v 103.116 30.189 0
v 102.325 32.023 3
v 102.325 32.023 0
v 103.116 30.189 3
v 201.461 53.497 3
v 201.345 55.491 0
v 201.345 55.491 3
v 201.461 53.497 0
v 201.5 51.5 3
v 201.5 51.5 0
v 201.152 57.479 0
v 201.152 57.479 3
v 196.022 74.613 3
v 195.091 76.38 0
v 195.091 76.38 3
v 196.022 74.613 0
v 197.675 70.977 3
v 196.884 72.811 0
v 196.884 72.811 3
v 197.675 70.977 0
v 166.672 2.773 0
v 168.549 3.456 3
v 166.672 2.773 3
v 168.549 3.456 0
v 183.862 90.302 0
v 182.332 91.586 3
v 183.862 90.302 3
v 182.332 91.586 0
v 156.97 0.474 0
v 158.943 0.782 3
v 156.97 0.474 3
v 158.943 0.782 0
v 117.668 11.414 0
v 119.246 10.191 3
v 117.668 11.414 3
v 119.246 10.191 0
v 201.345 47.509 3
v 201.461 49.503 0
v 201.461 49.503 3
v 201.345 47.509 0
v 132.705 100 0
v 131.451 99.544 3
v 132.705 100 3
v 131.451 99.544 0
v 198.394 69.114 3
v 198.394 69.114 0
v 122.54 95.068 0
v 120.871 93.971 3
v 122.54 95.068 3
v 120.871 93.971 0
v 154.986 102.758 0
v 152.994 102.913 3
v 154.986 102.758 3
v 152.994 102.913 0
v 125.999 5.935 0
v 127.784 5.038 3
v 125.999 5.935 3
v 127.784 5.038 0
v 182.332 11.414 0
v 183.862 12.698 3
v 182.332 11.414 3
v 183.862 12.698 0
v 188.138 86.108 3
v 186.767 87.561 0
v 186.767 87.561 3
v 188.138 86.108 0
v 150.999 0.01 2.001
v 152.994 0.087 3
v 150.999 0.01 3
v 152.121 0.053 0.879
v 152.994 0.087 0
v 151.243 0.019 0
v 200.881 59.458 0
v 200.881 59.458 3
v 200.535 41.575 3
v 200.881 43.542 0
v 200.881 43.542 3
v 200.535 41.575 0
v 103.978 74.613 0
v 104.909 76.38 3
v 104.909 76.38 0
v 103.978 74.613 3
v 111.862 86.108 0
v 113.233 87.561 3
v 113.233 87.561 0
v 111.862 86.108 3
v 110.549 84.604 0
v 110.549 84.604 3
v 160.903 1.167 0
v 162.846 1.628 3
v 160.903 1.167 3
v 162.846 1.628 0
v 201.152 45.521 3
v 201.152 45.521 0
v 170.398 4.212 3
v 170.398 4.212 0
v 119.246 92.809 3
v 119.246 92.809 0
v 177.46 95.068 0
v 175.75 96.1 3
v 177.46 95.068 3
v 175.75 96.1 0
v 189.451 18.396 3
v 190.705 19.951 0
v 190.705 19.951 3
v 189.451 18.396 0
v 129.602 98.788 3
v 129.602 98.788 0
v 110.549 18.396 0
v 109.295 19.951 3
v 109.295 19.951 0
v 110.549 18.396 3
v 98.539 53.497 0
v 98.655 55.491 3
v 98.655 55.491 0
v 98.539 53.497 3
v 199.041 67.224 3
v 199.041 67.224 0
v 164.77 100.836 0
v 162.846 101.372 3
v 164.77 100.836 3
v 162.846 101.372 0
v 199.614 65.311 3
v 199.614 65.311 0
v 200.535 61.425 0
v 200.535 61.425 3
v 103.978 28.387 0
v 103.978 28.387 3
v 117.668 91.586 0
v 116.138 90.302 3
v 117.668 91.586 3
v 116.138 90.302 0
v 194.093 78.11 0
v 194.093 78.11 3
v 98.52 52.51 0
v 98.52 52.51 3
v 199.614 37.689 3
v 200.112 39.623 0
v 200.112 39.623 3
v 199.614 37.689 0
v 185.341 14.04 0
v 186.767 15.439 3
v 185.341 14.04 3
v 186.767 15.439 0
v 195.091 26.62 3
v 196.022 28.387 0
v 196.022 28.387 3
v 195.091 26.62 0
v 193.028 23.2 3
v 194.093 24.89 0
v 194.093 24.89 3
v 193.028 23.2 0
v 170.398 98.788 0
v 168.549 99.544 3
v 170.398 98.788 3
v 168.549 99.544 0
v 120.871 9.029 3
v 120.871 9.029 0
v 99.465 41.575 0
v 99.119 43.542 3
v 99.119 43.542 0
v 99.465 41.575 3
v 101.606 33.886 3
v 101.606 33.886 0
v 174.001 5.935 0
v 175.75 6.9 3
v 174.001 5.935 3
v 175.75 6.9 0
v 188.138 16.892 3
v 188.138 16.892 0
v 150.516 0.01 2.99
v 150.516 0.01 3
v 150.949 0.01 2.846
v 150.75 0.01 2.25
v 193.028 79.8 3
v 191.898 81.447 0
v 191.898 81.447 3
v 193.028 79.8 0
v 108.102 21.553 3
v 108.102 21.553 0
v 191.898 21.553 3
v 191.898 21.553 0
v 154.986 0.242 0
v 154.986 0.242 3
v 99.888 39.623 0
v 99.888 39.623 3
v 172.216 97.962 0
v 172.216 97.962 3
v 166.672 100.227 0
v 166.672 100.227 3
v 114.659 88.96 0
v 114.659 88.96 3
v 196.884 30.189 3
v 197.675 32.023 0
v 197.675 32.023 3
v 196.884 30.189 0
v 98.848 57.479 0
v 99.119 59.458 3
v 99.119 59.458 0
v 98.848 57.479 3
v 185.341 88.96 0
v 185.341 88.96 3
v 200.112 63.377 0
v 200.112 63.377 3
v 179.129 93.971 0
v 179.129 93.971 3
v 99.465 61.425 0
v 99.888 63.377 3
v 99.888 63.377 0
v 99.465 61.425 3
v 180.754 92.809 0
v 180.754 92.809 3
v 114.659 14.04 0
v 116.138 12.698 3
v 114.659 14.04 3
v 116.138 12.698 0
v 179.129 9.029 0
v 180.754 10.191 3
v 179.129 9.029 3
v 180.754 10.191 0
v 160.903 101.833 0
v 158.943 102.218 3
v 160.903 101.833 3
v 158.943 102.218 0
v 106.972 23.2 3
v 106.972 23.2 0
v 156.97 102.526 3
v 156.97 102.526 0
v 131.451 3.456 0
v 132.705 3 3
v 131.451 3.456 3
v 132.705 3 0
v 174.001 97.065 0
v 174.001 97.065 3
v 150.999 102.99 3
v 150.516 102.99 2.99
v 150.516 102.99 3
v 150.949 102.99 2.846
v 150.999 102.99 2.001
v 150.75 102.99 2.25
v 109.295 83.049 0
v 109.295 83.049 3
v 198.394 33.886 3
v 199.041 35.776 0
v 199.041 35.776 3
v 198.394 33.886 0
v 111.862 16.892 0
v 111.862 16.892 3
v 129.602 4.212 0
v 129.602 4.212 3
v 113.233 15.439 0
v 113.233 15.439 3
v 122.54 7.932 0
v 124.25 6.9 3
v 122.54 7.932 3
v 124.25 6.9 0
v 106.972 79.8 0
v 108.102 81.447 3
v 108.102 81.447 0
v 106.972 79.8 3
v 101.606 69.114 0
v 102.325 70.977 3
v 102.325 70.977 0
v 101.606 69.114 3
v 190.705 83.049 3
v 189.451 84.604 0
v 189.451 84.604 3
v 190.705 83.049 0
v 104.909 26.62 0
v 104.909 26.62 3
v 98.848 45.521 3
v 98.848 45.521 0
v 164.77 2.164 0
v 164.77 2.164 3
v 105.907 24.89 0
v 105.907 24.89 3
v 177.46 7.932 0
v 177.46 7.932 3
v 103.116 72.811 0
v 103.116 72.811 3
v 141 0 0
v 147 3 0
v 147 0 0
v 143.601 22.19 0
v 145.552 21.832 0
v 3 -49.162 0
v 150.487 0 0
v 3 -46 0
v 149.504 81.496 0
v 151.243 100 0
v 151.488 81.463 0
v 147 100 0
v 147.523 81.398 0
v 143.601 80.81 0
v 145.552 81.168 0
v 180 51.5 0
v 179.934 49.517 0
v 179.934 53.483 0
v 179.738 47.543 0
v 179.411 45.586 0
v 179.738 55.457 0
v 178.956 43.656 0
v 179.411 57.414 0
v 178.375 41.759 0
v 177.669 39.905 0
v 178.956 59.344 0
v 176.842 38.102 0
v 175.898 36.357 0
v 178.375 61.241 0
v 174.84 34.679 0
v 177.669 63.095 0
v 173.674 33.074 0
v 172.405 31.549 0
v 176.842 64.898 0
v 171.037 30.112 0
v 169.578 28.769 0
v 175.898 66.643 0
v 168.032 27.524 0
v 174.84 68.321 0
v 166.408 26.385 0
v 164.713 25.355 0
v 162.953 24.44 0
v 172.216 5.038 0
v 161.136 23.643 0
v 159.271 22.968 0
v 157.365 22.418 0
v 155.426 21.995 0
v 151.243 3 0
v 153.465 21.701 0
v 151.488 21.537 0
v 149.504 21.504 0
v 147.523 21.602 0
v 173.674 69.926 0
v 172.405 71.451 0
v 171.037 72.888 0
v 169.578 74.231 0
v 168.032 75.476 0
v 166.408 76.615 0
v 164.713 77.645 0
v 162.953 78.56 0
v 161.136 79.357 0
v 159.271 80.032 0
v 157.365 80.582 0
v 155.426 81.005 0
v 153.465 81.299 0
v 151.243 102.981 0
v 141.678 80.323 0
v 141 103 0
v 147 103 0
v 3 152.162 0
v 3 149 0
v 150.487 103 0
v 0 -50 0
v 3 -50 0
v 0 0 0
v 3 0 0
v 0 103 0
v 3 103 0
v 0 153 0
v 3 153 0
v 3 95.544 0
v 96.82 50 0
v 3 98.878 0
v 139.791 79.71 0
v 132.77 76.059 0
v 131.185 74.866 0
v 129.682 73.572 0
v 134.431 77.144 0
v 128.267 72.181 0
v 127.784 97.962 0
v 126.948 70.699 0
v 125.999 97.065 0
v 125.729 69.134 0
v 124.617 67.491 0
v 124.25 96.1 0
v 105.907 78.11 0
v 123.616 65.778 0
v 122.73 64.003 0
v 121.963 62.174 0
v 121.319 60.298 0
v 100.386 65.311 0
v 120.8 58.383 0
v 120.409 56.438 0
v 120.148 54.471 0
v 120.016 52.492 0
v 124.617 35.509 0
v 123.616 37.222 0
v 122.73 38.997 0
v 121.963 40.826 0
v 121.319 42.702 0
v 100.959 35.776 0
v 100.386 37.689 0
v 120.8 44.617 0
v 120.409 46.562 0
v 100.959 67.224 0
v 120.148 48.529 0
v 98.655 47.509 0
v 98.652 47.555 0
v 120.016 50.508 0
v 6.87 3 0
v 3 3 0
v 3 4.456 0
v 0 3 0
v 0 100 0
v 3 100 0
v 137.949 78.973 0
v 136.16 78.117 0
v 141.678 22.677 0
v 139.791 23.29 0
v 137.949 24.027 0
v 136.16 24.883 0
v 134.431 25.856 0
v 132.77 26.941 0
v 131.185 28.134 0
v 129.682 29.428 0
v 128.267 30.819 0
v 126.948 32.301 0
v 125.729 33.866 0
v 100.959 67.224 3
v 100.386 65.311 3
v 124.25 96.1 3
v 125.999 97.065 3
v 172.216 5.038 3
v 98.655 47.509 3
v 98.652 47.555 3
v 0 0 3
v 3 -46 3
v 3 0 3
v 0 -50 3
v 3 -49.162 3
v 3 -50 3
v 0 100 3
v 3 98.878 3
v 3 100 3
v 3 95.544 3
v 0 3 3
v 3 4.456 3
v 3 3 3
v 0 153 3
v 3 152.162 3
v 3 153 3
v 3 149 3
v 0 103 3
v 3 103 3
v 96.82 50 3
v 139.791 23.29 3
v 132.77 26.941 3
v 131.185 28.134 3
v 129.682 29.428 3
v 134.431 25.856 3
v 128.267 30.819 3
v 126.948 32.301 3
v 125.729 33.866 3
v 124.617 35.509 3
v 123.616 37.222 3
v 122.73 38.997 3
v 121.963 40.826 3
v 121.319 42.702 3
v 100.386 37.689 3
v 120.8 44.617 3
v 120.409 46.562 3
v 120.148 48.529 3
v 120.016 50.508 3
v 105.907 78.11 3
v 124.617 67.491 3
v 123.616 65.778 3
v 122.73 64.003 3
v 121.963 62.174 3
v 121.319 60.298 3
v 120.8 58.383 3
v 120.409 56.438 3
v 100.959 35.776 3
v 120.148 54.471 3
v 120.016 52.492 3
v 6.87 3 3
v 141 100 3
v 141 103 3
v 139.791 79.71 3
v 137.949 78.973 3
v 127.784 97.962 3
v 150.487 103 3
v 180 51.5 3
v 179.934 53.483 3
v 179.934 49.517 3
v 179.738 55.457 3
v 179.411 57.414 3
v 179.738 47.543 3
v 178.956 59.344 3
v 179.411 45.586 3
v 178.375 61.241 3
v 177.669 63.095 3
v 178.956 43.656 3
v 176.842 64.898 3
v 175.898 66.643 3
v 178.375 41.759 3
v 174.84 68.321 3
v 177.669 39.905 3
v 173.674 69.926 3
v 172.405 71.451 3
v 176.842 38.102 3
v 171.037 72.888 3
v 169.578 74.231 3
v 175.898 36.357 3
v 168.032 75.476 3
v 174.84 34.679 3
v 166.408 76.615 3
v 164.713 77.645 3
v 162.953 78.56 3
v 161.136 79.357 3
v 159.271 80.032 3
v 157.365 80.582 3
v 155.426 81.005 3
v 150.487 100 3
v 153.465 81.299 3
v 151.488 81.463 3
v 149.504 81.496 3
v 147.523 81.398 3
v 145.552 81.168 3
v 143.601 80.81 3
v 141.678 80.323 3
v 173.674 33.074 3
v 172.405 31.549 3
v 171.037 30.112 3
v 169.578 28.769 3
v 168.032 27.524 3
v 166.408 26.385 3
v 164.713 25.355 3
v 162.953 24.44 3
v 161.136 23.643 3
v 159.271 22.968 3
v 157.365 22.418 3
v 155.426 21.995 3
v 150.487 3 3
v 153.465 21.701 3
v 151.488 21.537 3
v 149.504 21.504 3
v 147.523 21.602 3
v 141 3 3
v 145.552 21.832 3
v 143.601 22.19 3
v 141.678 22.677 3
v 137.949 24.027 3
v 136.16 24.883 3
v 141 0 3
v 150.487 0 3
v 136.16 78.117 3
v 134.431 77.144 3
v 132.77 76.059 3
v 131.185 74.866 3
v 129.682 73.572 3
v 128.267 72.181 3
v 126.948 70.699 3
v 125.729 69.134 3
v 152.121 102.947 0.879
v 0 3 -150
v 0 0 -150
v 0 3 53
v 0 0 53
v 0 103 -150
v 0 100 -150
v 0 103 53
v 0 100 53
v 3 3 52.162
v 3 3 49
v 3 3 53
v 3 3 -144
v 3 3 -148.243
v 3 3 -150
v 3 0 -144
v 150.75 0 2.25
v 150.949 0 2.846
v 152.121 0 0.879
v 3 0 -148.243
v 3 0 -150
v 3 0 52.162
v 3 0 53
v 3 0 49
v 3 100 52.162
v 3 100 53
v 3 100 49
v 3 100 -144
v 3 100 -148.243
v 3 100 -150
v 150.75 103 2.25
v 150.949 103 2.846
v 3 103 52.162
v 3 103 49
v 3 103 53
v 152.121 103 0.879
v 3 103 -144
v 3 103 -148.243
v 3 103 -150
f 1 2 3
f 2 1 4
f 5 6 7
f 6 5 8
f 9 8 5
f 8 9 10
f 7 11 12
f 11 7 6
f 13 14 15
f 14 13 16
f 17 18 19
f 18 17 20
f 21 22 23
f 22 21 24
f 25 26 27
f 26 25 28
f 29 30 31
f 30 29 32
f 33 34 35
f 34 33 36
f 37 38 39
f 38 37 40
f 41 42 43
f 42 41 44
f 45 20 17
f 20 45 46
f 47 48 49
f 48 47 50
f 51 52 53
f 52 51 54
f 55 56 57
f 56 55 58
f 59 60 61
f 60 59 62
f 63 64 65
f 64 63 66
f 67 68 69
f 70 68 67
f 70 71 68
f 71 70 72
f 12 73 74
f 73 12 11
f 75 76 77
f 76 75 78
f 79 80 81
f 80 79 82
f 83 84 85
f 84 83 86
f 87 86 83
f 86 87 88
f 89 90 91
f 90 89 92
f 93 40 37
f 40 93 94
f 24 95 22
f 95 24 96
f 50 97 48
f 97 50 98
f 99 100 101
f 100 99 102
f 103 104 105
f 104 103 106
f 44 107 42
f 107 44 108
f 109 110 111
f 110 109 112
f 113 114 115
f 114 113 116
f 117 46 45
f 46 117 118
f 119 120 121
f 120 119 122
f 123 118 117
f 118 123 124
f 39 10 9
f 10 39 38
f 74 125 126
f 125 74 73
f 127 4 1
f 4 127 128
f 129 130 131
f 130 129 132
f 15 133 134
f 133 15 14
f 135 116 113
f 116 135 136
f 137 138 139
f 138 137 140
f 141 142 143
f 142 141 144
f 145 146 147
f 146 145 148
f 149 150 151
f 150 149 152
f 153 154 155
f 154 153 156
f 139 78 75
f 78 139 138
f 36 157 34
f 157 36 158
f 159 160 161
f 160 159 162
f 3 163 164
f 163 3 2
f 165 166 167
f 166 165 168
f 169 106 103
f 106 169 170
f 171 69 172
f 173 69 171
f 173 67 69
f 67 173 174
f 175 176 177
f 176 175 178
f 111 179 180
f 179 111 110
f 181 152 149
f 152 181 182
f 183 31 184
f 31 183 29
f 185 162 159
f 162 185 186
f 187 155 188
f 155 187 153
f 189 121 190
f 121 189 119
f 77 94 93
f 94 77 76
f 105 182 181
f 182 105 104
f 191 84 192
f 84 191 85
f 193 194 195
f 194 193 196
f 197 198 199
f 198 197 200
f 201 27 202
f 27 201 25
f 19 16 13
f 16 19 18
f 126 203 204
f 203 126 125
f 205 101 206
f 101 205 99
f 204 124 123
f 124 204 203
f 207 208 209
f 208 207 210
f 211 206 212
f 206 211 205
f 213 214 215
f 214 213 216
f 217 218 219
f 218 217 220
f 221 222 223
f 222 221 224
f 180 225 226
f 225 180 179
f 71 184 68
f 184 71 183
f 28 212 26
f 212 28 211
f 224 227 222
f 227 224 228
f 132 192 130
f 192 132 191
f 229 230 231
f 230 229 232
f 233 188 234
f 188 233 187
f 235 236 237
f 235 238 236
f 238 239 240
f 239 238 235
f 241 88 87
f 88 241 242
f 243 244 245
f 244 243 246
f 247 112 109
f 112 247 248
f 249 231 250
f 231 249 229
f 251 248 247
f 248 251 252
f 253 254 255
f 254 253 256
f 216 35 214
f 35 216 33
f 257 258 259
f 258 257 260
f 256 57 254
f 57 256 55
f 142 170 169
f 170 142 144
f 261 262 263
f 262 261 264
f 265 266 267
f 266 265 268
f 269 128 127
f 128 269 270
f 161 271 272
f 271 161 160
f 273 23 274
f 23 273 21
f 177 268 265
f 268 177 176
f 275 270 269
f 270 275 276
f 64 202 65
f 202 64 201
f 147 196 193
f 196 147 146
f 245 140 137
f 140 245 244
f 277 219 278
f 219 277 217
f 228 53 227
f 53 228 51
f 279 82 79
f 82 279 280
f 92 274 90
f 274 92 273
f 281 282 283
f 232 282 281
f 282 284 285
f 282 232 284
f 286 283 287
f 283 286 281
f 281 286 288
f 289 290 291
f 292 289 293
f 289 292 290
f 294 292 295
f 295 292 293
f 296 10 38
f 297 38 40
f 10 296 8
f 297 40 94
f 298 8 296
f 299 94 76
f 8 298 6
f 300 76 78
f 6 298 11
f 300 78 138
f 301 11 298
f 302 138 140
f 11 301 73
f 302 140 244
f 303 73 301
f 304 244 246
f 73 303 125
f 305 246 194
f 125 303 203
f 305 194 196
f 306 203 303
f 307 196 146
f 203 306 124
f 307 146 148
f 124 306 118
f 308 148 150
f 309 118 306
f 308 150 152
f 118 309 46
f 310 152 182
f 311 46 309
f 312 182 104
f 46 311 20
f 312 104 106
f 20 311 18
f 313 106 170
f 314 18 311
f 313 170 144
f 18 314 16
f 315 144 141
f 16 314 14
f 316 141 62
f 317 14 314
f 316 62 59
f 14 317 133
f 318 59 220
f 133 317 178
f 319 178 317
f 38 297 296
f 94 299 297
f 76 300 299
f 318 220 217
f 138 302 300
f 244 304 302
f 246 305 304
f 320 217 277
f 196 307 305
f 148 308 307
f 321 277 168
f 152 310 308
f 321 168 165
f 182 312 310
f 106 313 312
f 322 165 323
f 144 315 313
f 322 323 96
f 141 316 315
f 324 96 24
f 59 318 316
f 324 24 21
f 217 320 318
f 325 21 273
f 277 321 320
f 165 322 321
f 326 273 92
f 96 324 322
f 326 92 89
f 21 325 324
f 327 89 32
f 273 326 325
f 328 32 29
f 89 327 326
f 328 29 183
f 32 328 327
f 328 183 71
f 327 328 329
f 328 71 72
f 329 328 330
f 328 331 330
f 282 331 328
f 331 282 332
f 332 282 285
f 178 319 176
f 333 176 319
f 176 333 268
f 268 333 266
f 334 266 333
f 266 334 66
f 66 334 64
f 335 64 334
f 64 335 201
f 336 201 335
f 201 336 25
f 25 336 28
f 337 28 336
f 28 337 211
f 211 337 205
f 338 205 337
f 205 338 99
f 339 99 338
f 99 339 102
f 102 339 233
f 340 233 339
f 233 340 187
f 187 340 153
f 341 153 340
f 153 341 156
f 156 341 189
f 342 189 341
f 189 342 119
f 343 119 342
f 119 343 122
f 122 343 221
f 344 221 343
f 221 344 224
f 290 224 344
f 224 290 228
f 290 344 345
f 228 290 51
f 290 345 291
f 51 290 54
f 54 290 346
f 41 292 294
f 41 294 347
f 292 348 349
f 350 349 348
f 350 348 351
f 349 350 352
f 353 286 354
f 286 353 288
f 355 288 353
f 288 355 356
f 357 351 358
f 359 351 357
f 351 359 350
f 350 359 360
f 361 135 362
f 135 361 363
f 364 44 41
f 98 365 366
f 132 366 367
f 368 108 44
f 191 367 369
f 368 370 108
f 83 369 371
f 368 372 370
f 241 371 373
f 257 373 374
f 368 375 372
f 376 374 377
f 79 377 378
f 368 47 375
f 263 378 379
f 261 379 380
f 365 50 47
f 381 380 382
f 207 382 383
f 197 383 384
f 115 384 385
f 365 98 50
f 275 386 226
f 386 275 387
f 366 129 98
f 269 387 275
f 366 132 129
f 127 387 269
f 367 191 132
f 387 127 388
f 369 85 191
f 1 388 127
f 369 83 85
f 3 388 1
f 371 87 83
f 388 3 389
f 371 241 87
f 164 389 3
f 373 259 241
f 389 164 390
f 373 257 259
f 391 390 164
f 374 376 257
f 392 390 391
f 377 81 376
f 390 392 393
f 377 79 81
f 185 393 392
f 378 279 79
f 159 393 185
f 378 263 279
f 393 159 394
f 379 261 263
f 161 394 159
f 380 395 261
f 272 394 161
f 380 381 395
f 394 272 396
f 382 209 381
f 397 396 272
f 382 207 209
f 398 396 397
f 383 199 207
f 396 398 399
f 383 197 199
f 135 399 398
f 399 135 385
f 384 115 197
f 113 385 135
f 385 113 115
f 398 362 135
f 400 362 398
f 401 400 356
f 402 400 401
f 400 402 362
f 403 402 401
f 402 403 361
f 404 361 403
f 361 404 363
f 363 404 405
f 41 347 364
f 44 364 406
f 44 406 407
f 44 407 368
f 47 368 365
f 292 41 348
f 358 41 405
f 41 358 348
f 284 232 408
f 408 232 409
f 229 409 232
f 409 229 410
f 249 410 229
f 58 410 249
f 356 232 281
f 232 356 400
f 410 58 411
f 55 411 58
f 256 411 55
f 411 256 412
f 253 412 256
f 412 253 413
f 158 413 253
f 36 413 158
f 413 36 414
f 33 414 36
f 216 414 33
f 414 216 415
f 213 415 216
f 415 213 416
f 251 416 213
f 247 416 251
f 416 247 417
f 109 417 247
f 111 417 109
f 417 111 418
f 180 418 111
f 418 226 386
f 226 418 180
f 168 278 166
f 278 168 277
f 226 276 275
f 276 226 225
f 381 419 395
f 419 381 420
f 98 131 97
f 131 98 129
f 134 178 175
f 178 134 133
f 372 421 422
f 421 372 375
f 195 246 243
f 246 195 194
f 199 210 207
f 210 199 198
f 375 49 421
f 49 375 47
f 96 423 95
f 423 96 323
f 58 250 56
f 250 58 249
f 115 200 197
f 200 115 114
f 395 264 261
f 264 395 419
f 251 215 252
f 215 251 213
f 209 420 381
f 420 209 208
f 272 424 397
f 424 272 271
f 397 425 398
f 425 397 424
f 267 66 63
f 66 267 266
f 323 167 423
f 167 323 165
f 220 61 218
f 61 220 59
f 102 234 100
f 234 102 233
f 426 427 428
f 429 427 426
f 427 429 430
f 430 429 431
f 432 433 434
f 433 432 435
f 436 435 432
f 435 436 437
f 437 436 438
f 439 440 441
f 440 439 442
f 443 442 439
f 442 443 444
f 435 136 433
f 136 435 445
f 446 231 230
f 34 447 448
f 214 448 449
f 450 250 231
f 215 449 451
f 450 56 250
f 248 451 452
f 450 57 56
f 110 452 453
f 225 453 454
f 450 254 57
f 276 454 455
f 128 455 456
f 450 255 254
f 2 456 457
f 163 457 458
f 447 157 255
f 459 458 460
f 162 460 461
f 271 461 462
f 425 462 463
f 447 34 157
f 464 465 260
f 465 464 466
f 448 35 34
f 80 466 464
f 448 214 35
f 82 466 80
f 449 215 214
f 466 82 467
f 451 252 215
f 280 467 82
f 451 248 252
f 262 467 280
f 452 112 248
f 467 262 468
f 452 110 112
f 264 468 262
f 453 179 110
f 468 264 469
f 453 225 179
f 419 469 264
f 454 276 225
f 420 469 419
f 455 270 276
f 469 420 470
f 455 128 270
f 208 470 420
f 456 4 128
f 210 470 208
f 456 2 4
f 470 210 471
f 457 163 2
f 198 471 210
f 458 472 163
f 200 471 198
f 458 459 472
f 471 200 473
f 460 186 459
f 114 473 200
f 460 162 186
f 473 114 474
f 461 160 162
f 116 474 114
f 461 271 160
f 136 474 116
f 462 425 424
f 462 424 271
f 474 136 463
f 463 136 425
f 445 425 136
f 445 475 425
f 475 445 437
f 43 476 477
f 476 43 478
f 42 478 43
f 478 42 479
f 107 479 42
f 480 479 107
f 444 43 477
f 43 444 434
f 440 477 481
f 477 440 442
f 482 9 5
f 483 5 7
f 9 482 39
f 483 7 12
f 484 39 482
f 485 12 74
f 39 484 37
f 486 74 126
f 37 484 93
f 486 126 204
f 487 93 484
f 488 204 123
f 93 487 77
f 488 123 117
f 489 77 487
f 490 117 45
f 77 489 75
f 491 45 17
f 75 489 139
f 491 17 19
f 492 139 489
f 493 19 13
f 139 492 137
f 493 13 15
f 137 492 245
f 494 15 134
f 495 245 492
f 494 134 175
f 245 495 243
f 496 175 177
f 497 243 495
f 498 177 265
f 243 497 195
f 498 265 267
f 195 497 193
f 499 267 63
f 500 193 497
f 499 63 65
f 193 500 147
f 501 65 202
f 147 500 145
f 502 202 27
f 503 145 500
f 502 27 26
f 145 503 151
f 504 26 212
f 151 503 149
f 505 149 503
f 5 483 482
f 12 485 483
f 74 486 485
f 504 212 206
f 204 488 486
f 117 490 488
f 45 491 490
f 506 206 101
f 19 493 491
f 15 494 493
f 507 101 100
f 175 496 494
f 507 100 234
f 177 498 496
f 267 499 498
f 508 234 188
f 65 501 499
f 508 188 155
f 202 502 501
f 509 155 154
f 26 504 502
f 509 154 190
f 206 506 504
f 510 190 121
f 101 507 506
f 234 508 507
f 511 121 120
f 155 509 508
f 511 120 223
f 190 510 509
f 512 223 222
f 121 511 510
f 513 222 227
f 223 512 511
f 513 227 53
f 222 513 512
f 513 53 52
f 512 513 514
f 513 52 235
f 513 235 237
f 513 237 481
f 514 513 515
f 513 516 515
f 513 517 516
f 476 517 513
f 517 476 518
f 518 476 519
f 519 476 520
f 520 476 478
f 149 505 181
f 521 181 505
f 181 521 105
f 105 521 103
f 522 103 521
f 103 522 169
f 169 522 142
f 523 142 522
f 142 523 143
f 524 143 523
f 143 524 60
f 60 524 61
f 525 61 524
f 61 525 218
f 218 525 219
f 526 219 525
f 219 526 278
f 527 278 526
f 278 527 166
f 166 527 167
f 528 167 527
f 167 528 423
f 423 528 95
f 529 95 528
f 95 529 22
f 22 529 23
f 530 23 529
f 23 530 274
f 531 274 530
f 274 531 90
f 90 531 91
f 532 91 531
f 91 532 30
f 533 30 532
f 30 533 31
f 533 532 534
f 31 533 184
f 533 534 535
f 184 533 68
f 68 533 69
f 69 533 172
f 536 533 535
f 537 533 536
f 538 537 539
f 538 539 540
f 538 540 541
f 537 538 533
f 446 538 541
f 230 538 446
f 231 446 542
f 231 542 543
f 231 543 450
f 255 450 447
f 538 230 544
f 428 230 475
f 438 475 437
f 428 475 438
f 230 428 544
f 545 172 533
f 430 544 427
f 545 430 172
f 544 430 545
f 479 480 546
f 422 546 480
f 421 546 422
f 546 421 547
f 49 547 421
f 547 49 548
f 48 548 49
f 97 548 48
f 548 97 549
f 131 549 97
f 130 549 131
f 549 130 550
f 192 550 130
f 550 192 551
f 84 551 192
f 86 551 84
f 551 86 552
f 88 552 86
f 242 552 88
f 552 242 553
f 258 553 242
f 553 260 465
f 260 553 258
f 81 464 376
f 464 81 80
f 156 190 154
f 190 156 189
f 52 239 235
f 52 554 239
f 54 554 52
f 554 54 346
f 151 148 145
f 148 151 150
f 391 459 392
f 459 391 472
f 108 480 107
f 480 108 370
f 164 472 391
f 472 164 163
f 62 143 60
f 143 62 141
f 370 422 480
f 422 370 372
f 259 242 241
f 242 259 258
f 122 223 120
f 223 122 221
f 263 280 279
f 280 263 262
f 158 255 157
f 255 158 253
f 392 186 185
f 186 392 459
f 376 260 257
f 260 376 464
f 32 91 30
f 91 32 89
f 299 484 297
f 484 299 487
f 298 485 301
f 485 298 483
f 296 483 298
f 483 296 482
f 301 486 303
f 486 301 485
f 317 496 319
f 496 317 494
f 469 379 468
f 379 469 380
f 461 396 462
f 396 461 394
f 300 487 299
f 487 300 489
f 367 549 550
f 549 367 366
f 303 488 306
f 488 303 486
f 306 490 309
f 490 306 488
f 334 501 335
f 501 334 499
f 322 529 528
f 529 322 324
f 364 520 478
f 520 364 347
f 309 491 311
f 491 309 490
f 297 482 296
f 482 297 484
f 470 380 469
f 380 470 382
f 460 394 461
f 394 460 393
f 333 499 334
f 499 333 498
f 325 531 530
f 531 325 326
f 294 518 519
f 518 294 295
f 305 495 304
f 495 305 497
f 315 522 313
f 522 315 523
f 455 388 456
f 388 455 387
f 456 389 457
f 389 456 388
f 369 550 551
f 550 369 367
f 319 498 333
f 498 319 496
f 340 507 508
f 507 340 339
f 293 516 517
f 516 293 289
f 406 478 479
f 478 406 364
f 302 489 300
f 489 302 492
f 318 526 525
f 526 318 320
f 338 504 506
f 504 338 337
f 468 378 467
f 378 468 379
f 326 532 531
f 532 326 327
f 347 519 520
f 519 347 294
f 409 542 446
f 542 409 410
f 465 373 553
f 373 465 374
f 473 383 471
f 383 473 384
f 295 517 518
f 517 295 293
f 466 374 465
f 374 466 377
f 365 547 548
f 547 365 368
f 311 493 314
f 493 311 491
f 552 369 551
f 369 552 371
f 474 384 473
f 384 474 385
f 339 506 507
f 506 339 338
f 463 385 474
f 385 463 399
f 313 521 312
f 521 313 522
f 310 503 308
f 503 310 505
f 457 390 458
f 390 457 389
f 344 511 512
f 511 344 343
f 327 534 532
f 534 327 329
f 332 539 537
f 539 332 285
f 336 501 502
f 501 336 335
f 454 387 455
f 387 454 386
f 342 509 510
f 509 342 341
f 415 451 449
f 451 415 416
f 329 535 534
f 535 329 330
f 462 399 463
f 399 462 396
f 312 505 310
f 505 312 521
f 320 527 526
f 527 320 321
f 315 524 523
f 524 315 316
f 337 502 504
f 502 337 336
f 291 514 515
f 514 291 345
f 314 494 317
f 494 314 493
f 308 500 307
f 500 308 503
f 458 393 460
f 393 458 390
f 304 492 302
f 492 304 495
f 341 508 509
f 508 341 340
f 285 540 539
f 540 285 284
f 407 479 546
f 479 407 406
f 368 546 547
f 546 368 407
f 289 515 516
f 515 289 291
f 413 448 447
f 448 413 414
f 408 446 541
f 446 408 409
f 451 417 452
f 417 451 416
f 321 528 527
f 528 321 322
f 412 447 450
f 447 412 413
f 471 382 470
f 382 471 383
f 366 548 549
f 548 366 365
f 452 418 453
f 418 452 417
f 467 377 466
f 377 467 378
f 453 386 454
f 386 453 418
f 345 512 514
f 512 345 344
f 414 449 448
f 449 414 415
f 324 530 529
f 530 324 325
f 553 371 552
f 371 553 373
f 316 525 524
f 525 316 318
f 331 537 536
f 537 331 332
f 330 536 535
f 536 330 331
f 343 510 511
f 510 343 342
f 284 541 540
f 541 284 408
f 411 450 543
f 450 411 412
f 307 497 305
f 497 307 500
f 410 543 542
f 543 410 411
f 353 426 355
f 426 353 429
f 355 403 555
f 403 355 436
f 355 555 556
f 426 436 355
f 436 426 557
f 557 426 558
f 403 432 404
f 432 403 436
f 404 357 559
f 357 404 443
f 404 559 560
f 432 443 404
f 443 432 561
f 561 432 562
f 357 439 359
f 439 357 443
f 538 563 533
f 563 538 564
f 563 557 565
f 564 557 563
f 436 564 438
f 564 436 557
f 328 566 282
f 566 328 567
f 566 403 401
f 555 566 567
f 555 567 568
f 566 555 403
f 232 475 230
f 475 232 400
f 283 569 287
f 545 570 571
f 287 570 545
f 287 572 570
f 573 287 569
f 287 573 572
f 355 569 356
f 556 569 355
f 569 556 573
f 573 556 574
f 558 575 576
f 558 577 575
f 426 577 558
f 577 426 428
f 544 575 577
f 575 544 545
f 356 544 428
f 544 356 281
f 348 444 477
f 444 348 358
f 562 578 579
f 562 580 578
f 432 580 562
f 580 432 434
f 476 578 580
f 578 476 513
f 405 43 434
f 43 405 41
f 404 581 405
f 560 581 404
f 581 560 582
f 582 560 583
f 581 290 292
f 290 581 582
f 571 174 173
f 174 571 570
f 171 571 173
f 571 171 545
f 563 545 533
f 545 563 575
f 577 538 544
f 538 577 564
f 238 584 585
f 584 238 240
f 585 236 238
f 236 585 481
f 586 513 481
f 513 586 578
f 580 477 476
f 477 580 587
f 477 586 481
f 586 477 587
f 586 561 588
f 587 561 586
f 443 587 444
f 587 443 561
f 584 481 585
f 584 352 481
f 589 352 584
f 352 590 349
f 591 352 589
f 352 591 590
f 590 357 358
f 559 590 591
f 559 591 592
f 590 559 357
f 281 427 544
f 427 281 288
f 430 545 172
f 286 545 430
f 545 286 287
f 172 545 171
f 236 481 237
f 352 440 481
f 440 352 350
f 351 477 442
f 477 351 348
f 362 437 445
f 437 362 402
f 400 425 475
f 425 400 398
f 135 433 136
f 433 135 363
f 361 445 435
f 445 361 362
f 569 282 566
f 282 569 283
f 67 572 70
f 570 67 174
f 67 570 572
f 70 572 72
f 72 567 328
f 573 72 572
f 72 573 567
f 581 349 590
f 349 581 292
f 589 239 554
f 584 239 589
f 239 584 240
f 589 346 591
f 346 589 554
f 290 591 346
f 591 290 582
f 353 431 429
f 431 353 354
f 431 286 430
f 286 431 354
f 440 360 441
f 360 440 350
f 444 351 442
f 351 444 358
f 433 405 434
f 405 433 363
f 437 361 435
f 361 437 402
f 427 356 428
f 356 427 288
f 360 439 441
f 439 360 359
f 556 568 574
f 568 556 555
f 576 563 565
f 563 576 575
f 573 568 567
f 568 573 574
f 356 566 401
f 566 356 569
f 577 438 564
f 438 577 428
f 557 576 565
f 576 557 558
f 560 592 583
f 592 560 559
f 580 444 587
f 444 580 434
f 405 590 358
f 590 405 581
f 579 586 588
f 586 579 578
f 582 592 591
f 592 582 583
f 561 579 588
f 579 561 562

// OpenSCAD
depth = 150;
thickness = 3;
up = 50;
down = 150;
diameter = 100;
width = 20;

module strut(dimension, length)
{
    cube([length, dimension, dimension]);
}



strut(thickness,depth);

translate([0,diameter,0])
{
    strut(thickness,depth);
}

// upper struts
translate([0,0,up])
rotate([0,atan2(up,depth),0])
{
    strut(thickness,sqrt(depth*depth+up*up));
}

translate([0,diameter,up])
rotate([0,atan2(up,depth),0])
{
    strut(thickness,sqrt(depth*depth+up*up));
}

// outer struts
translate([0,-up+thickness,0])
rotate([0,0,atan2(up,depth)])
translate([0,-thickness,0])
{
    strut(thickness,sqrt(pow(depth,2)+pow(up,2)));
}

translate([0,diameter+up,0])
rotate([0,0,-atan2(up,depth)])
{
    strut(thickness,sqrt(pow(depth,2)+pow(up,2)));
};


// inner struts
translate([0,thickness,0])
rotate([0,0,atan2(up,depth-diameter/2+thickness)])
translate([0,-thickness,0])
{
    strut(thickness,sqrt(pow(depth-diameter/2+thickness,2)+pow(up,2)));
}

translate([0,diameter-thickness,0])
rotate([0,0,-atan2(up,depth-diameter/2+thickness)])
{
    strut(thickness,sqrt(pow(depth-diameter/2+thickness,2)+pow(up,2)));
};


// lower struts

translate([0,0,-down+thickness])
rotate([0,atan2(-down,depth),0])
translate([0,0,-thickness])
{
    strut(thickness,sqrt(depth*depth+down*down));
}

translate([0,diameter,-down+thickness])
rotate([0,atan2(-down,depth),0])
translate([0,0,-thickness])
{
    strut(thickness,sqrt(depth*depth+down*down));
}



// the ring
translate([depth,diameter/2+thickness/2,0])
{
    difference()
    {
        cylinder($fa = 1, d = diameter+thickness, h = thickness);
        translate([0,0,-1])
        {
            cylinder($fa = 1, d = diameter-(2*width), h = thickness+2);
        }
    }
};


// backstruts
// horizontal
translate([thickness,-diameter/2,0])
rotate([0,0,90])
{
    strut(thickness,diameter + 2*up + thickness);
}

// vertical
translate([0,0,up+thickness])
rotate([0,90,0])
{
    strut(thickness,depth + up + thickness);
}

translate([0,diameter,up+thickness])
rotate([0,90,0])
{
    strut(thickness,depth + up + thickness);
}



/*
// backplate
translate([0,-(up+thickness/2),-(down+thickness/2)])
{
    cube([thickness, diameter + 2*up + 2*thickness, up+down+2*thickness]);
}
*/
